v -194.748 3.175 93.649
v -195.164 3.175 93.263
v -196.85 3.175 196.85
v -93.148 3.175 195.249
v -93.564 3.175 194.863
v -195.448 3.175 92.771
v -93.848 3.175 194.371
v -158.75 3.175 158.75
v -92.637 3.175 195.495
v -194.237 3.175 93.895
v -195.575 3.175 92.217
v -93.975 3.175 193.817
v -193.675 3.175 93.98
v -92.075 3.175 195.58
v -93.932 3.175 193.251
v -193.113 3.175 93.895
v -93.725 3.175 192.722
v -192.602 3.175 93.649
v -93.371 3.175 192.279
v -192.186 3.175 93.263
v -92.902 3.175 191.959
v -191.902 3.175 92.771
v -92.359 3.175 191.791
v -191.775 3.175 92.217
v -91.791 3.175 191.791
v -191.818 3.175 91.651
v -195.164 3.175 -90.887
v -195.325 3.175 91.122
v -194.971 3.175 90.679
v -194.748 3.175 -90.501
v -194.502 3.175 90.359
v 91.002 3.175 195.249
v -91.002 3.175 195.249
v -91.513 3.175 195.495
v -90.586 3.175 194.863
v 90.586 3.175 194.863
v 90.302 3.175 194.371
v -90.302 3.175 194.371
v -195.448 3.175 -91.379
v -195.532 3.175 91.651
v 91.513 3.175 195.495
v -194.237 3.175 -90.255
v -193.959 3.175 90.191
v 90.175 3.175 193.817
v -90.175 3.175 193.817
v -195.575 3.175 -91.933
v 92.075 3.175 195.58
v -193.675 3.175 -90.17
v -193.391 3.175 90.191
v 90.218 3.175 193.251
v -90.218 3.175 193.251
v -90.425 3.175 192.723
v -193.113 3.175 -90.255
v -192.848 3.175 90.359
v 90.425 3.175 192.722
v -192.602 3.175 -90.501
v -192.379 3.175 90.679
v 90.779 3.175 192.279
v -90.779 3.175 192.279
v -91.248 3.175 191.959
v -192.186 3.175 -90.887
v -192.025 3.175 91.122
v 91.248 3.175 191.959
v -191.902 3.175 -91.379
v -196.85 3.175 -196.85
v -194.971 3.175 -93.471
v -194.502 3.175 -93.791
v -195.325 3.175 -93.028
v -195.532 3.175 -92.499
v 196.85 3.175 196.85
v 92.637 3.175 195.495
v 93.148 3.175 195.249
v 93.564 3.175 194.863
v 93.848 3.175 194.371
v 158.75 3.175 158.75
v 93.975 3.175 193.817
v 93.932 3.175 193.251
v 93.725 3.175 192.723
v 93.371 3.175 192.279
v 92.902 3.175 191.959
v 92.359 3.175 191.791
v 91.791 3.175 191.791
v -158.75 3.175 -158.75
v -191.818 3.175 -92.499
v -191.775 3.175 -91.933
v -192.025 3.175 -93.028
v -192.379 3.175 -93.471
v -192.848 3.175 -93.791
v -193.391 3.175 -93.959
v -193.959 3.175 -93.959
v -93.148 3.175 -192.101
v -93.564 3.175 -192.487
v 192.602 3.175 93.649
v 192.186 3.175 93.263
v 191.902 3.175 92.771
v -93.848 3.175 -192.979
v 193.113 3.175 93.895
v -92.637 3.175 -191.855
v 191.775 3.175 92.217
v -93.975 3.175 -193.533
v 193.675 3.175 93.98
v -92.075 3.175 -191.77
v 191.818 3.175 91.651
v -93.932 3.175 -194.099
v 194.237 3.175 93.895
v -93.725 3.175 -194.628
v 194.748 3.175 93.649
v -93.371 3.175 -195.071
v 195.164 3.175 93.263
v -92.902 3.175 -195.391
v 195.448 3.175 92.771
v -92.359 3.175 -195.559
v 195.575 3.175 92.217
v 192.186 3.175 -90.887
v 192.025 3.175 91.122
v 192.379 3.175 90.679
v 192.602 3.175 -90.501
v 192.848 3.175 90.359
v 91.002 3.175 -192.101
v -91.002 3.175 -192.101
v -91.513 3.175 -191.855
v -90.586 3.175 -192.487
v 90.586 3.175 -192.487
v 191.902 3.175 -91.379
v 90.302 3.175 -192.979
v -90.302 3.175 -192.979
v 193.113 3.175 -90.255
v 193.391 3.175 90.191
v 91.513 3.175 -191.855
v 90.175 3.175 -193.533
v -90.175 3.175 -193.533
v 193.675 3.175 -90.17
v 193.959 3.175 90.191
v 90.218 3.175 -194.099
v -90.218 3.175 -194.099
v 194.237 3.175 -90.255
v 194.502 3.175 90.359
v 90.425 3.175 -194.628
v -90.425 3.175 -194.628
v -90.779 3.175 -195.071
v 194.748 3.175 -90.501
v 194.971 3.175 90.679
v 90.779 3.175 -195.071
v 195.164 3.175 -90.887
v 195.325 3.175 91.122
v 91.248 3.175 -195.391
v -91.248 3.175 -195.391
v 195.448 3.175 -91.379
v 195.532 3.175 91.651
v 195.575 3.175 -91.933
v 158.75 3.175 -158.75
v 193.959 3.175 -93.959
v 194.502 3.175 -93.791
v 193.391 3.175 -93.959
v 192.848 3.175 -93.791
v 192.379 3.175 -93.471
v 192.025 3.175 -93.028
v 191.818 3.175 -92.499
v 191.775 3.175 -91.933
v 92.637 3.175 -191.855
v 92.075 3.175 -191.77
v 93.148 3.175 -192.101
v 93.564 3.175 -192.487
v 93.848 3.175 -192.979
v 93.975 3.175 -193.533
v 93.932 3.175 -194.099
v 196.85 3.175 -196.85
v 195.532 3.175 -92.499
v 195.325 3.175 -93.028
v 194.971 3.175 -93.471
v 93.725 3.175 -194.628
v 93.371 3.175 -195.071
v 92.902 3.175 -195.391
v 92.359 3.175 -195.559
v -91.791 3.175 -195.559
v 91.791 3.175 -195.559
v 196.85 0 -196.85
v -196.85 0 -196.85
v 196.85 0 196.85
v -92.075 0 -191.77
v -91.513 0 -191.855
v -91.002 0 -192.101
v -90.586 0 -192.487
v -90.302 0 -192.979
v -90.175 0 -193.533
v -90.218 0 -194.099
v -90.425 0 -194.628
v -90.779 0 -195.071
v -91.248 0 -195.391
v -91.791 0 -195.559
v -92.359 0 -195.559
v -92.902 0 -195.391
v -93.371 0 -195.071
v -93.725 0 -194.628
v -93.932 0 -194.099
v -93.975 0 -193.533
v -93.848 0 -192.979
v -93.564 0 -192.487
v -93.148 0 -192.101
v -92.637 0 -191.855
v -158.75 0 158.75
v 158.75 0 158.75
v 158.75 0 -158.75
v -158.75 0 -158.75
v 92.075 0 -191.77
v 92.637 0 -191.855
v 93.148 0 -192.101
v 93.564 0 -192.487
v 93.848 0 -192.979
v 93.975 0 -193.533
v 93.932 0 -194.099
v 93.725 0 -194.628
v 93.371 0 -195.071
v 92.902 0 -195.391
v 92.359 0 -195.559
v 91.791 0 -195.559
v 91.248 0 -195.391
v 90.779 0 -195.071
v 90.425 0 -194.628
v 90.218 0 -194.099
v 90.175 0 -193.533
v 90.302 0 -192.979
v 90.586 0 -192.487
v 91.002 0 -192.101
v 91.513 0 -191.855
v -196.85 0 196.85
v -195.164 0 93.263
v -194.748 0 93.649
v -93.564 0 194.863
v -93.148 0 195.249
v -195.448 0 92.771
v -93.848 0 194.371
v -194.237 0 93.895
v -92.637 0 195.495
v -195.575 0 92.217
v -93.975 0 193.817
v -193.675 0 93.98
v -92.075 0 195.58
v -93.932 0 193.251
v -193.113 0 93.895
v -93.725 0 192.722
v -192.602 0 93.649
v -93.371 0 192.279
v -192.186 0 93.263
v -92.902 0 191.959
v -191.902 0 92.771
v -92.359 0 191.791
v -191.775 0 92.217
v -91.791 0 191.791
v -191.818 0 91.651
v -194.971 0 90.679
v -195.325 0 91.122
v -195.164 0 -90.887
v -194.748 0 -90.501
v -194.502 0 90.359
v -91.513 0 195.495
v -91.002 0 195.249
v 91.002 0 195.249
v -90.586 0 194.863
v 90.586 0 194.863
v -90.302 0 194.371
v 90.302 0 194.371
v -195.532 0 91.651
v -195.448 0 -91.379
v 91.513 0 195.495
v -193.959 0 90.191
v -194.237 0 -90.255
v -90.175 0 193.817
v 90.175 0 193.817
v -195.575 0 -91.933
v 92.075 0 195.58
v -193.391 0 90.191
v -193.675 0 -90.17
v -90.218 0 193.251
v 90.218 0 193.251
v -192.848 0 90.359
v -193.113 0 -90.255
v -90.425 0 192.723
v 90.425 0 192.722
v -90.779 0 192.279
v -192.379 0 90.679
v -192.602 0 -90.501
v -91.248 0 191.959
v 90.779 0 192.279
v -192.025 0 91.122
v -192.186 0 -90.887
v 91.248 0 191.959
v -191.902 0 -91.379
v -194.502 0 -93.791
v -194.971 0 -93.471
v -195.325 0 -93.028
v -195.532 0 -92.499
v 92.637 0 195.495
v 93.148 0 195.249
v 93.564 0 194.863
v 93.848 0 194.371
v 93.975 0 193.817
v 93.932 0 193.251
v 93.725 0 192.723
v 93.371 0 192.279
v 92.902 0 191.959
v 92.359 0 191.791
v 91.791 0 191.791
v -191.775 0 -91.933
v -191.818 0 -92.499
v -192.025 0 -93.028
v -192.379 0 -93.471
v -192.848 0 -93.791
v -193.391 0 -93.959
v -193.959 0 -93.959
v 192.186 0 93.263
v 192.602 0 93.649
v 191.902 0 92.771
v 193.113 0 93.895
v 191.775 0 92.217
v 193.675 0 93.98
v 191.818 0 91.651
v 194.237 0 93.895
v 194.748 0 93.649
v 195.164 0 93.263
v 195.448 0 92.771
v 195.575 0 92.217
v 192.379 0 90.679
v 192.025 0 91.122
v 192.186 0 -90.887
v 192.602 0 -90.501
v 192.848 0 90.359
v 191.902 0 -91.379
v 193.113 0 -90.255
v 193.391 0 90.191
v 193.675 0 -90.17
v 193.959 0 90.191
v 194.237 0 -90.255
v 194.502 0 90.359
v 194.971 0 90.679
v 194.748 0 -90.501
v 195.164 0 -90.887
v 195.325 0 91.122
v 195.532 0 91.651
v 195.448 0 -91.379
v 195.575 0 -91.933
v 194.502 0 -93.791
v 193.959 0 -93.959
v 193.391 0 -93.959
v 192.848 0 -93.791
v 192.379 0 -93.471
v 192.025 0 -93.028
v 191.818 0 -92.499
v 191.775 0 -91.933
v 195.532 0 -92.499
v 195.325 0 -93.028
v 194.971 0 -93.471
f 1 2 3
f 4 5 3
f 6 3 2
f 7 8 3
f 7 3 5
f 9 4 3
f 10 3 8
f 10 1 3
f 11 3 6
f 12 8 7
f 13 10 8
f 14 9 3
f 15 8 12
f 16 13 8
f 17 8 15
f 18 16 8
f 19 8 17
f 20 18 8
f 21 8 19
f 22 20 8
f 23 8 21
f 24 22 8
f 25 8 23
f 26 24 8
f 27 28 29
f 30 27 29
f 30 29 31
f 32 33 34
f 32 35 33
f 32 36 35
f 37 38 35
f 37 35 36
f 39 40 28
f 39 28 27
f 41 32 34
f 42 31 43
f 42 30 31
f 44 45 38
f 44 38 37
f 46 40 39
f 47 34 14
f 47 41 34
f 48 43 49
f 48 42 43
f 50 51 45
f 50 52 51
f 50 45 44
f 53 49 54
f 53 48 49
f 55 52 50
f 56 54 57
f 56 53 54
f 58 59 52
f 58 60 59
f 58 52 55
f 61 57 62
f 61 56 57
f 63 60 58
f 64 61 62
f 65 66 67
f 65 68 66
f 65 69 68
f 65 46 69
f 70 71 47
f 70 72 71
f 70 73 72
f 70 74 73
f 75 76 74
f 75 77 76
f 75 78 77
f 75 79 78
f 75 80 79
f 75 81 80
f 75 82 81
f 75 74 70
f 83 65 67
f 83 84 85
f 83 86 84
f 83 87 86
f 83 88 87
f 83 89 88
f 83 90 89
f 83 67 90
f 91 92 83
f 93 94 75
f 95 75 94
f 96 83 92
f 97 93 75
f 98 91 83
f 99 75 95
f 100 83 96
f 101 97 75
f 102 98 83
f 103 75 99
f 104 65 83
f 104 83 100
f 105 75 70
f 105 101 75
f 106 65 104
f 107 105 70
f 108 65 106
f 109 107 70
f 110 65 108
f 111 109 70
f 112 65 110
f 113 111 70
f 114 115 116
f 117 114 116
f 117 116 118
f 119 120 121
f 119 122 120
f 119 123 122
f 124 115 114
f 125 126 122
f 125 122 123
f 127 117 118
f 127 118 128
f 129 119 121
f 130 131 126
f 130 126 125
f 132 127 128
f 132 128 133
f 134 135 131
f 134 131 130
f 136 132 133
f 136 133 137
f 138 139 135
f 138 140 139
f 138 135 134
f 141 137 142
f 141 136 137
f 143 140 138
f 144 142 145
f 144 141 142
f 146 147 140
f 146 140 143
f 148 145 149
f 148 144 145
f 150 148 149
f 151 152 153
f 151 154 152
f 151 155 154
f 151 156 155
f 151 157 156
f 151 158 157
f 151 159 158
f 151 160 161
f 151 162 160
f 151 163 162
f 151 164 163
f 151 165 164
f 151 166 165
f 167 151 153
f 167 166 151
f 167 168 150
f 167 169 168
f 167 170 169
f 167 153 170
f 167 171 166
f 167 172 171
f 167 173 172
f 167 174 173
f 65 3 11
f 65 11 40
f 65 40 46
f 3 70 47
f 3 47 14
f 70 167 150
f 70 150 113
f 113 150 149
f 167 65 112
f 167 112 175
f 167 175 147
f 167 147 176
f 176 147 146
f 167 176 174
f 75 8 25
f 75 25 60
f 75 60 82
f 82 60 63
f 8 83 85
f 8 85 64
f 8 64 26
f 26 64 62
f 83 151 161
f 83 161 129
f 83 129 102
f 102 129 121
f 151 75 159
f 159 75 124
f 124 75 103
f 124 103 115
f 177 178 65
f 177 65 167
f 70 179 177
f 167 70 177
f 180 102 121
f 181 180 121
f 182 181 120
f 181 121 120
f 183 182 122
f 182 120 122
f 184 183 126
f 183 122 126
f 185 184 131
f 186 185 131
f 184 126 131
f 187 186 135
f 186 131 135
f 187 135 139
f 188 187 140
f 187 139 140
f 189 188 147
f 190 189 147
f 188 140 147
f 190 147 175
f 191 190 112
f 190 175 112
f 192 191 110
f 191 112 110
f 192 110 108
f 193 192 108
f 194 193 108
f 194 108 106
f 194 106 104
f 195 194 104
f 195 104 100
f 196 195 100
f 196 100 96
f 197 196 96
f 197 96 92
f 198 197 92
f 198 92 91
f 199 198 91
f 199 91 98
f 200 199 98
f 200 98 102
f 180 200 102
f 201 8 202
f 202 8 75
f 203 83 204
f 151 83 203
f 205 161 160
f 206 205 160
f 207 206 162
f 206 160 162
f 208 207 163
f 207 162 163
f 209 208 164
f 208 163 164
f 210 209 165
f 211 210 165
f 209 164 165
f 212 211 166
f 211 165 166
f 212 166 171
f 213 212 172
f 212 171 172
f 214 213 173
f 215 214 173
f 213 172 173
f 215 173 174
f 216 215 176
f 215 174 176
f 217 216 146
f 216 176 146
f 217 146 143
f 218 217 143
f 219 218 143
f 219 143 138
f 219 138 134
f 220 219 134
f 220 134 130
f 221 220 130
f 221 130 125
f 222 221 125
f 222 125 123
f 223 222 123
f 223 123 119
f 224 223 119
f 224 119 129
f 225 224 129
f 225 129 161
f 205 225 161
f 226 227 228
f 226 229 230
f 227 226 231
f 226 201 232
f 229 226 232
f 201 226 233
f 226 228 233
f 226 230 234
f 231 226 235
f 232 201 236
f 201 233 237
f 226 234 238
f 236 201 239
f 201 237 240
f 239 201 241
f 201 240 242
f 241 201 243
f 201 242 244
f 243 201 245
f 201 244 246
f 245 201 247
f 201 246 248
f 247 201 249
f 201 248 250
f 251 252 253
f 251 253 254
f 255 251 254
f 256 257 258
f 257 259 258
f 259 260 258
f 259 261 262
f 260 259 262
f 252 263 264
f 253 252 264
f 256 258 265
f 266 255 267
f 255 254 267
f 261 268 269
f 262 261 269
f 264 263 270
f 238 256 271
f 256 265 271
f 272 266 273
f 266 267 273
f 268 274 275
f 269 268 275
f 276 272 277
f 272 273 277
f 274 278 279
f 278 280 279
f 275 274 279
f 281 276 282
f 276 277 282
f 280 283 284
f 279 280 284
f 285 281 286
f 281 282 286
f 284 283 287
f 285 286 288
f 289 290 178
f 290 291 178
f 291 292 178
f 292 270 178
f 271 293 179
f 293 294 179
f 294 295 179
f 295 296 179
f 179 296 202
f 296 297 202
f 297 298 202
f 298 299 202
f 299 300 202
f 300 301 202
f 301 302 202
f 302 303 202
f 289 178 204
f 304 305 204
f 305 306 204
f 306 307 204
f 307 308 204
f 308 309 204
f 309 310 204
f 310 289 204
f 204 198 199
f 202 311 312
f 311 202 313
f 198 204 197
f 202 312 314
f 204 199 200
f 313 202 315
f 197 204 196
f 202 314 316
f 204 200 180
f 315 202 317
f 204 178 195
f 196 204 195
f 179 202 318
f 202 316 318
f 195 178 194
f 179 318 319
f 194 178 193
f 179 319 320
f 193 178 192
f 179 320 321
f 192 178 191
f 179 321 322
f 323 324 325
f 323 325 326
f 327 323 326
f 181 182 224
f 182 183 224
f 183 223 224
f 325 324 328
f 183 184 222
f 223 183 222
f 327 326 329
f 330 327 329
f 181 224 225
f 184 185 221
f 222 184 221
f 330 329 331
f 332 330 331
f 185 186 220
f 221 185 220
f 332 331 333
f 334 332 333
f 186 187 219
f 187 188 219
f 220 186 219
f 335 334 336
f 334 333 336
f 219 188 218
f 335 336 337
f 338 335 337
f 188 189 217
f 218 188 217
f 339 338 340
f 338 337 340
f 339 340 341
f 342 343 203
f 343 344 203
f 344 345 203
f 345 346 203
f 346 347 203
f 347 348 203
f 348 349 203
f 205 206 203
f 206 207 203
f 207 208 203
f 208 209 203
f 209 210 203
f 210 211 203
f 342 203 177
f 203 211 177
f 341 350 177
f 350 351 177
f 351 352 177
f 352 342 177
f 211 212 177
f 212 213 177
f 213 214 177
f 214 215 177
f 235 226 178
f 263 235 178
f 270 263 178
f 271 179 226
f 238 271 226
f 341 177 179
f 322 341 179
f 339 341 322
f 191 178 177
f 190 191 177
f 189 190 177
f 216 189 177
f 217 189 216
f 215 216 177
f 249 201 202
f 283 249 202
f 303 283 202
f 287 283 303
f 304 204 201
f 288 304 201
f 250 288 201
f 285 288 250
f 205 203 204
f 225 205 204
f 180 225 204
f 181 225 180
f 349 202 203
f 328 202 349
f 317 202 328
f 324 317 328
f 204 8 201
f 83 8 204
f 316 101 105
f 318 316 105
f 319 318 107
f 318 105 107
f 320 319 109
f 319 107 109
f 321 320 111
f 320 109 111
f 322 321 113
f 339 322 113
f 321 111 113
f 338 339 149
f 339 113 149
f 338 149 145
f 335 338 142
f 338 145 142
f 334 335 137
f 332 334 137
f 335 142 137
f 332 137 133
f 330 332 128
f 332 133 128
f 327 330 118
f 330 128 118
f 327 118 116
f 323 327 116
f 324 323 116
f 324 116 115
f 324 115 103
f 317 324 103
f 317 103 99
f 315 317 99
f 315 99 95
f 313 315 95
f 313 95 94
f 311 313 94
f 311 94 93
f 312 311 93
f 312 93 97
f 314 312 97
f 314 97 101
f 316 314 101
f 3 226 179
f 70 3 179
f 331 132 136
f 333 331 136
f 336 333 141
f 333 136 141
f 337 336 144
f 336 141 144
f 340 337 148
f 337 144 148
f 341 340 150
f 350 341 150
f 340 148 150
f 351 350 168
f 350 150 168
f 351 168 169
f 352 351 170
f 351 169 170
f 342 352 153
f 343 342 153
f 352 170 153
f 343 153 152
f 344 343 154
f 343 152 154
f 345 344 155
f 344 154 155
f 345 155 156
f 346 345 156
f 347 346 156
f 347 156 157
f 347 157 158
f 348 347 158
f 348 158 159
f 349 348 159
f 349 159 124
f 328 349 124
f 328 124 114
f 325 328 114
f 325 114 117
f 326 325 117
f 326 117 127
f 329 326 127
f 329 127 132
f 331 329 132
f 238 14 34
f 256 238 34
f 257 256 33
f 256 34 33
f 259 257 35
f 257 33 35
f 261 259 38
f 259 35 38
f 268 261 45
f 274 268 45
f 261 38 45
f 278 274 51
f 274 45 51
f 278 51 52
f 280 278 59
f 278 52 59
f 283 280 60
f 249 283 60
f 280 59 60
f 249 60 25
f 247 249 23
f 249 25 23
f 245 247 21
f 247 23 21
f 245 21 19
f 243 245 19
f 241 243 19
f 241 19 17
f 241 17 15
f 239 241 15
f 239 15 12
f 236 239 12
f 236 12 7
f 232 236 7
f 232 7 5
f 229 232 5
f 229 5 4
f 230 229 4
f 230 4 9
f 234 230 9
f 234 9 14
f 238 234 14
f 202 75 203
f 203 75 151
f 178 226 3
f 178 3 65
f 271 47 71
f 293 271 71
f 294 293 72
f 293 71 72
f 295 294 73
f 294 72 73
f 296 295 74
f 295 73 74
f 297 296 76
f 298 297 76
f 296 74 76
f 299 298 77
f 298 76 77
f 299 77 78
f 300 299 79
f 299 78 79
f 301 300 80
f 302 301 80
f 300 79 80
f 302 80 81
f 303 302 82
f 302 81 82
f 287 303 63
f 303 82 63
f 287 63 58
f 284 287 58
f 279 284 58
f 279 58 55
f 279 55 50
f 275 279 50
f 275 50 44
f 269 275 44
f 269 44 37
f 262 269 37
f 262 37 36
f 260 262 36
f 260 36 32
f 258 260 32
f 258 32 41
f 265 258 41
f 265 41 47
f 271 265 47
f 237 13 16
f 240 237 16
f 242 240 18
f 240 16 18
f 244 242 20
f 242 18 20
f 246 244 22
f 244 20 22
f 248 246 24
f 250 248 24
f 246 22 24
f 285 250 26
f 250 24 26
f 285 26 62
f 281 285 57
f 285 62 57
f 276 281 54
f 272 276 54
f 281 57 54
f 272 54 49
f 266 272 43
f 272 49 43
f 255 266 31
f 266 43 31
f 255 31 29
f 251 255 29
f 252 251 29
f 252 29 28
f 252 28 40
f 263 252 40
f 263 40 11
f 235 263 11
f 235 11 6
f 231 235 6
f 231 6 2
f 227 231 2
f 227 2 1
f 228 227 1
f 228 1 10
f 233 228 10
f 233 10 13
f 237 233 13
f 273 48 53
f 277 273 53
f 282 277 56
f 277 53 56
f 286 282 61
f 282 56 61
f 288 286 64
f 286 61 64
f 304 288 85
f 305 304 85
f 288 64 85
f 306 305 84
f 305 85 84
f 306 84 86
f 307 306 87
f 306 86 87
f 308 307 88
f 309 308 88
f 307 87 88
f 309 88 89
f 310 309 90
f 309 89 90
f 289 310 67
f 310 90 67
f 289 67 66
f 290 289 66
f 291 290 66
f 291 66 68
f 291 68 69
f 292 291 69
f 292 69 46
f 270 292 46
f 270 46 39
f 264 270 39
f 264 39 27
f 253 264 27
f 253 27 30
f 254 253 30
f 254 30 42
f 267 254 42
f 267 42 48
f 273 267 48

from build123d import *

# Parameters (mm, degrees)
SKETCH1_W           = 393.7
SKETCH1_H           = 393.7
BOSS_EXTRUDE1_DEPTH = 3.175
SKETCH2_W           = 317.5
SKETCH2_H           = 317.5
CUT_EXTRUDE1_DEPTH  = 279.40604452
SKETCH3_R           = 1.905
CUT_EXTRUDE3_DEPTH  = 279.40604452


with BuildPart() as part:
    # Sketch1 → Boss-Extrude1 (new body)
    with BuildSketch(Plane(origin=(0, 0, 0), x_dir=(1, 0, 0), z_dir=(0, 1, 0))):
        Rectangle(SKETCH1_W, SKETCH1_H)
    extrude(amount=BOSS_EXTRUDE1_DEPTH)

    # Sketch2 → Cut-Extrude1 (cut, through all)
    with BuildSketch(Plane(origin=(0, 3.175, 0), x_dir=(1, 0, 0), z_dir=(0, 1, 0))):
        Rectangle(SKETCH2_W, SKETCH2_H)
    extrude(amount=-CUT_EXTRUDE1_DEPTH, mode=Mode.SUBTRACT)

    # Sketch3 → Cut-Extrude3 (cut, through all)
    with BuildSketch(Plane(origin=(0, 3.175, 0), x_dir=(1, 0, 0), z_dir=(0, 1, 0))):
        with Locations(Location((-92.075, -193.675, 0), (0, 0, 270))):
            Circle(SKETCH3_R)
        with Locations(Location((92.075, -193.675, 0), (0, 0, 270))):
            Circle(SKETCH3_R)
        with Locations(Location((193.675, -92.075, 0), (0, 0, 270))):
            Circle(SKETCH3_R)
        with Locations(Location((193.675, 92.075, 0), (0, 0, 270))):
            Circle(SKETCH3_R)
        with Locations(Location((92.075, 193.675, 0), (0, 0, 270))):
            Circle(SKETCH3_R)
        with Locations(Location((-92.075, 193.675, 0), (0, 0, 270))):
            Circle(SKETCH3_R)
        with Locations(Location((-193.675, 92.075, 0), (0, 0, 270))):
            Circle(SKETCH3_R)
        with Locations(Location((-193.675, -92.075, 0), (0, 0, 270))):
            Circle(SKETCH3_R)
    extrude(amount=-CUT_EXTRUDE3_DEPTH, mode=Mode.SUBTRACT)


solid = part.part
